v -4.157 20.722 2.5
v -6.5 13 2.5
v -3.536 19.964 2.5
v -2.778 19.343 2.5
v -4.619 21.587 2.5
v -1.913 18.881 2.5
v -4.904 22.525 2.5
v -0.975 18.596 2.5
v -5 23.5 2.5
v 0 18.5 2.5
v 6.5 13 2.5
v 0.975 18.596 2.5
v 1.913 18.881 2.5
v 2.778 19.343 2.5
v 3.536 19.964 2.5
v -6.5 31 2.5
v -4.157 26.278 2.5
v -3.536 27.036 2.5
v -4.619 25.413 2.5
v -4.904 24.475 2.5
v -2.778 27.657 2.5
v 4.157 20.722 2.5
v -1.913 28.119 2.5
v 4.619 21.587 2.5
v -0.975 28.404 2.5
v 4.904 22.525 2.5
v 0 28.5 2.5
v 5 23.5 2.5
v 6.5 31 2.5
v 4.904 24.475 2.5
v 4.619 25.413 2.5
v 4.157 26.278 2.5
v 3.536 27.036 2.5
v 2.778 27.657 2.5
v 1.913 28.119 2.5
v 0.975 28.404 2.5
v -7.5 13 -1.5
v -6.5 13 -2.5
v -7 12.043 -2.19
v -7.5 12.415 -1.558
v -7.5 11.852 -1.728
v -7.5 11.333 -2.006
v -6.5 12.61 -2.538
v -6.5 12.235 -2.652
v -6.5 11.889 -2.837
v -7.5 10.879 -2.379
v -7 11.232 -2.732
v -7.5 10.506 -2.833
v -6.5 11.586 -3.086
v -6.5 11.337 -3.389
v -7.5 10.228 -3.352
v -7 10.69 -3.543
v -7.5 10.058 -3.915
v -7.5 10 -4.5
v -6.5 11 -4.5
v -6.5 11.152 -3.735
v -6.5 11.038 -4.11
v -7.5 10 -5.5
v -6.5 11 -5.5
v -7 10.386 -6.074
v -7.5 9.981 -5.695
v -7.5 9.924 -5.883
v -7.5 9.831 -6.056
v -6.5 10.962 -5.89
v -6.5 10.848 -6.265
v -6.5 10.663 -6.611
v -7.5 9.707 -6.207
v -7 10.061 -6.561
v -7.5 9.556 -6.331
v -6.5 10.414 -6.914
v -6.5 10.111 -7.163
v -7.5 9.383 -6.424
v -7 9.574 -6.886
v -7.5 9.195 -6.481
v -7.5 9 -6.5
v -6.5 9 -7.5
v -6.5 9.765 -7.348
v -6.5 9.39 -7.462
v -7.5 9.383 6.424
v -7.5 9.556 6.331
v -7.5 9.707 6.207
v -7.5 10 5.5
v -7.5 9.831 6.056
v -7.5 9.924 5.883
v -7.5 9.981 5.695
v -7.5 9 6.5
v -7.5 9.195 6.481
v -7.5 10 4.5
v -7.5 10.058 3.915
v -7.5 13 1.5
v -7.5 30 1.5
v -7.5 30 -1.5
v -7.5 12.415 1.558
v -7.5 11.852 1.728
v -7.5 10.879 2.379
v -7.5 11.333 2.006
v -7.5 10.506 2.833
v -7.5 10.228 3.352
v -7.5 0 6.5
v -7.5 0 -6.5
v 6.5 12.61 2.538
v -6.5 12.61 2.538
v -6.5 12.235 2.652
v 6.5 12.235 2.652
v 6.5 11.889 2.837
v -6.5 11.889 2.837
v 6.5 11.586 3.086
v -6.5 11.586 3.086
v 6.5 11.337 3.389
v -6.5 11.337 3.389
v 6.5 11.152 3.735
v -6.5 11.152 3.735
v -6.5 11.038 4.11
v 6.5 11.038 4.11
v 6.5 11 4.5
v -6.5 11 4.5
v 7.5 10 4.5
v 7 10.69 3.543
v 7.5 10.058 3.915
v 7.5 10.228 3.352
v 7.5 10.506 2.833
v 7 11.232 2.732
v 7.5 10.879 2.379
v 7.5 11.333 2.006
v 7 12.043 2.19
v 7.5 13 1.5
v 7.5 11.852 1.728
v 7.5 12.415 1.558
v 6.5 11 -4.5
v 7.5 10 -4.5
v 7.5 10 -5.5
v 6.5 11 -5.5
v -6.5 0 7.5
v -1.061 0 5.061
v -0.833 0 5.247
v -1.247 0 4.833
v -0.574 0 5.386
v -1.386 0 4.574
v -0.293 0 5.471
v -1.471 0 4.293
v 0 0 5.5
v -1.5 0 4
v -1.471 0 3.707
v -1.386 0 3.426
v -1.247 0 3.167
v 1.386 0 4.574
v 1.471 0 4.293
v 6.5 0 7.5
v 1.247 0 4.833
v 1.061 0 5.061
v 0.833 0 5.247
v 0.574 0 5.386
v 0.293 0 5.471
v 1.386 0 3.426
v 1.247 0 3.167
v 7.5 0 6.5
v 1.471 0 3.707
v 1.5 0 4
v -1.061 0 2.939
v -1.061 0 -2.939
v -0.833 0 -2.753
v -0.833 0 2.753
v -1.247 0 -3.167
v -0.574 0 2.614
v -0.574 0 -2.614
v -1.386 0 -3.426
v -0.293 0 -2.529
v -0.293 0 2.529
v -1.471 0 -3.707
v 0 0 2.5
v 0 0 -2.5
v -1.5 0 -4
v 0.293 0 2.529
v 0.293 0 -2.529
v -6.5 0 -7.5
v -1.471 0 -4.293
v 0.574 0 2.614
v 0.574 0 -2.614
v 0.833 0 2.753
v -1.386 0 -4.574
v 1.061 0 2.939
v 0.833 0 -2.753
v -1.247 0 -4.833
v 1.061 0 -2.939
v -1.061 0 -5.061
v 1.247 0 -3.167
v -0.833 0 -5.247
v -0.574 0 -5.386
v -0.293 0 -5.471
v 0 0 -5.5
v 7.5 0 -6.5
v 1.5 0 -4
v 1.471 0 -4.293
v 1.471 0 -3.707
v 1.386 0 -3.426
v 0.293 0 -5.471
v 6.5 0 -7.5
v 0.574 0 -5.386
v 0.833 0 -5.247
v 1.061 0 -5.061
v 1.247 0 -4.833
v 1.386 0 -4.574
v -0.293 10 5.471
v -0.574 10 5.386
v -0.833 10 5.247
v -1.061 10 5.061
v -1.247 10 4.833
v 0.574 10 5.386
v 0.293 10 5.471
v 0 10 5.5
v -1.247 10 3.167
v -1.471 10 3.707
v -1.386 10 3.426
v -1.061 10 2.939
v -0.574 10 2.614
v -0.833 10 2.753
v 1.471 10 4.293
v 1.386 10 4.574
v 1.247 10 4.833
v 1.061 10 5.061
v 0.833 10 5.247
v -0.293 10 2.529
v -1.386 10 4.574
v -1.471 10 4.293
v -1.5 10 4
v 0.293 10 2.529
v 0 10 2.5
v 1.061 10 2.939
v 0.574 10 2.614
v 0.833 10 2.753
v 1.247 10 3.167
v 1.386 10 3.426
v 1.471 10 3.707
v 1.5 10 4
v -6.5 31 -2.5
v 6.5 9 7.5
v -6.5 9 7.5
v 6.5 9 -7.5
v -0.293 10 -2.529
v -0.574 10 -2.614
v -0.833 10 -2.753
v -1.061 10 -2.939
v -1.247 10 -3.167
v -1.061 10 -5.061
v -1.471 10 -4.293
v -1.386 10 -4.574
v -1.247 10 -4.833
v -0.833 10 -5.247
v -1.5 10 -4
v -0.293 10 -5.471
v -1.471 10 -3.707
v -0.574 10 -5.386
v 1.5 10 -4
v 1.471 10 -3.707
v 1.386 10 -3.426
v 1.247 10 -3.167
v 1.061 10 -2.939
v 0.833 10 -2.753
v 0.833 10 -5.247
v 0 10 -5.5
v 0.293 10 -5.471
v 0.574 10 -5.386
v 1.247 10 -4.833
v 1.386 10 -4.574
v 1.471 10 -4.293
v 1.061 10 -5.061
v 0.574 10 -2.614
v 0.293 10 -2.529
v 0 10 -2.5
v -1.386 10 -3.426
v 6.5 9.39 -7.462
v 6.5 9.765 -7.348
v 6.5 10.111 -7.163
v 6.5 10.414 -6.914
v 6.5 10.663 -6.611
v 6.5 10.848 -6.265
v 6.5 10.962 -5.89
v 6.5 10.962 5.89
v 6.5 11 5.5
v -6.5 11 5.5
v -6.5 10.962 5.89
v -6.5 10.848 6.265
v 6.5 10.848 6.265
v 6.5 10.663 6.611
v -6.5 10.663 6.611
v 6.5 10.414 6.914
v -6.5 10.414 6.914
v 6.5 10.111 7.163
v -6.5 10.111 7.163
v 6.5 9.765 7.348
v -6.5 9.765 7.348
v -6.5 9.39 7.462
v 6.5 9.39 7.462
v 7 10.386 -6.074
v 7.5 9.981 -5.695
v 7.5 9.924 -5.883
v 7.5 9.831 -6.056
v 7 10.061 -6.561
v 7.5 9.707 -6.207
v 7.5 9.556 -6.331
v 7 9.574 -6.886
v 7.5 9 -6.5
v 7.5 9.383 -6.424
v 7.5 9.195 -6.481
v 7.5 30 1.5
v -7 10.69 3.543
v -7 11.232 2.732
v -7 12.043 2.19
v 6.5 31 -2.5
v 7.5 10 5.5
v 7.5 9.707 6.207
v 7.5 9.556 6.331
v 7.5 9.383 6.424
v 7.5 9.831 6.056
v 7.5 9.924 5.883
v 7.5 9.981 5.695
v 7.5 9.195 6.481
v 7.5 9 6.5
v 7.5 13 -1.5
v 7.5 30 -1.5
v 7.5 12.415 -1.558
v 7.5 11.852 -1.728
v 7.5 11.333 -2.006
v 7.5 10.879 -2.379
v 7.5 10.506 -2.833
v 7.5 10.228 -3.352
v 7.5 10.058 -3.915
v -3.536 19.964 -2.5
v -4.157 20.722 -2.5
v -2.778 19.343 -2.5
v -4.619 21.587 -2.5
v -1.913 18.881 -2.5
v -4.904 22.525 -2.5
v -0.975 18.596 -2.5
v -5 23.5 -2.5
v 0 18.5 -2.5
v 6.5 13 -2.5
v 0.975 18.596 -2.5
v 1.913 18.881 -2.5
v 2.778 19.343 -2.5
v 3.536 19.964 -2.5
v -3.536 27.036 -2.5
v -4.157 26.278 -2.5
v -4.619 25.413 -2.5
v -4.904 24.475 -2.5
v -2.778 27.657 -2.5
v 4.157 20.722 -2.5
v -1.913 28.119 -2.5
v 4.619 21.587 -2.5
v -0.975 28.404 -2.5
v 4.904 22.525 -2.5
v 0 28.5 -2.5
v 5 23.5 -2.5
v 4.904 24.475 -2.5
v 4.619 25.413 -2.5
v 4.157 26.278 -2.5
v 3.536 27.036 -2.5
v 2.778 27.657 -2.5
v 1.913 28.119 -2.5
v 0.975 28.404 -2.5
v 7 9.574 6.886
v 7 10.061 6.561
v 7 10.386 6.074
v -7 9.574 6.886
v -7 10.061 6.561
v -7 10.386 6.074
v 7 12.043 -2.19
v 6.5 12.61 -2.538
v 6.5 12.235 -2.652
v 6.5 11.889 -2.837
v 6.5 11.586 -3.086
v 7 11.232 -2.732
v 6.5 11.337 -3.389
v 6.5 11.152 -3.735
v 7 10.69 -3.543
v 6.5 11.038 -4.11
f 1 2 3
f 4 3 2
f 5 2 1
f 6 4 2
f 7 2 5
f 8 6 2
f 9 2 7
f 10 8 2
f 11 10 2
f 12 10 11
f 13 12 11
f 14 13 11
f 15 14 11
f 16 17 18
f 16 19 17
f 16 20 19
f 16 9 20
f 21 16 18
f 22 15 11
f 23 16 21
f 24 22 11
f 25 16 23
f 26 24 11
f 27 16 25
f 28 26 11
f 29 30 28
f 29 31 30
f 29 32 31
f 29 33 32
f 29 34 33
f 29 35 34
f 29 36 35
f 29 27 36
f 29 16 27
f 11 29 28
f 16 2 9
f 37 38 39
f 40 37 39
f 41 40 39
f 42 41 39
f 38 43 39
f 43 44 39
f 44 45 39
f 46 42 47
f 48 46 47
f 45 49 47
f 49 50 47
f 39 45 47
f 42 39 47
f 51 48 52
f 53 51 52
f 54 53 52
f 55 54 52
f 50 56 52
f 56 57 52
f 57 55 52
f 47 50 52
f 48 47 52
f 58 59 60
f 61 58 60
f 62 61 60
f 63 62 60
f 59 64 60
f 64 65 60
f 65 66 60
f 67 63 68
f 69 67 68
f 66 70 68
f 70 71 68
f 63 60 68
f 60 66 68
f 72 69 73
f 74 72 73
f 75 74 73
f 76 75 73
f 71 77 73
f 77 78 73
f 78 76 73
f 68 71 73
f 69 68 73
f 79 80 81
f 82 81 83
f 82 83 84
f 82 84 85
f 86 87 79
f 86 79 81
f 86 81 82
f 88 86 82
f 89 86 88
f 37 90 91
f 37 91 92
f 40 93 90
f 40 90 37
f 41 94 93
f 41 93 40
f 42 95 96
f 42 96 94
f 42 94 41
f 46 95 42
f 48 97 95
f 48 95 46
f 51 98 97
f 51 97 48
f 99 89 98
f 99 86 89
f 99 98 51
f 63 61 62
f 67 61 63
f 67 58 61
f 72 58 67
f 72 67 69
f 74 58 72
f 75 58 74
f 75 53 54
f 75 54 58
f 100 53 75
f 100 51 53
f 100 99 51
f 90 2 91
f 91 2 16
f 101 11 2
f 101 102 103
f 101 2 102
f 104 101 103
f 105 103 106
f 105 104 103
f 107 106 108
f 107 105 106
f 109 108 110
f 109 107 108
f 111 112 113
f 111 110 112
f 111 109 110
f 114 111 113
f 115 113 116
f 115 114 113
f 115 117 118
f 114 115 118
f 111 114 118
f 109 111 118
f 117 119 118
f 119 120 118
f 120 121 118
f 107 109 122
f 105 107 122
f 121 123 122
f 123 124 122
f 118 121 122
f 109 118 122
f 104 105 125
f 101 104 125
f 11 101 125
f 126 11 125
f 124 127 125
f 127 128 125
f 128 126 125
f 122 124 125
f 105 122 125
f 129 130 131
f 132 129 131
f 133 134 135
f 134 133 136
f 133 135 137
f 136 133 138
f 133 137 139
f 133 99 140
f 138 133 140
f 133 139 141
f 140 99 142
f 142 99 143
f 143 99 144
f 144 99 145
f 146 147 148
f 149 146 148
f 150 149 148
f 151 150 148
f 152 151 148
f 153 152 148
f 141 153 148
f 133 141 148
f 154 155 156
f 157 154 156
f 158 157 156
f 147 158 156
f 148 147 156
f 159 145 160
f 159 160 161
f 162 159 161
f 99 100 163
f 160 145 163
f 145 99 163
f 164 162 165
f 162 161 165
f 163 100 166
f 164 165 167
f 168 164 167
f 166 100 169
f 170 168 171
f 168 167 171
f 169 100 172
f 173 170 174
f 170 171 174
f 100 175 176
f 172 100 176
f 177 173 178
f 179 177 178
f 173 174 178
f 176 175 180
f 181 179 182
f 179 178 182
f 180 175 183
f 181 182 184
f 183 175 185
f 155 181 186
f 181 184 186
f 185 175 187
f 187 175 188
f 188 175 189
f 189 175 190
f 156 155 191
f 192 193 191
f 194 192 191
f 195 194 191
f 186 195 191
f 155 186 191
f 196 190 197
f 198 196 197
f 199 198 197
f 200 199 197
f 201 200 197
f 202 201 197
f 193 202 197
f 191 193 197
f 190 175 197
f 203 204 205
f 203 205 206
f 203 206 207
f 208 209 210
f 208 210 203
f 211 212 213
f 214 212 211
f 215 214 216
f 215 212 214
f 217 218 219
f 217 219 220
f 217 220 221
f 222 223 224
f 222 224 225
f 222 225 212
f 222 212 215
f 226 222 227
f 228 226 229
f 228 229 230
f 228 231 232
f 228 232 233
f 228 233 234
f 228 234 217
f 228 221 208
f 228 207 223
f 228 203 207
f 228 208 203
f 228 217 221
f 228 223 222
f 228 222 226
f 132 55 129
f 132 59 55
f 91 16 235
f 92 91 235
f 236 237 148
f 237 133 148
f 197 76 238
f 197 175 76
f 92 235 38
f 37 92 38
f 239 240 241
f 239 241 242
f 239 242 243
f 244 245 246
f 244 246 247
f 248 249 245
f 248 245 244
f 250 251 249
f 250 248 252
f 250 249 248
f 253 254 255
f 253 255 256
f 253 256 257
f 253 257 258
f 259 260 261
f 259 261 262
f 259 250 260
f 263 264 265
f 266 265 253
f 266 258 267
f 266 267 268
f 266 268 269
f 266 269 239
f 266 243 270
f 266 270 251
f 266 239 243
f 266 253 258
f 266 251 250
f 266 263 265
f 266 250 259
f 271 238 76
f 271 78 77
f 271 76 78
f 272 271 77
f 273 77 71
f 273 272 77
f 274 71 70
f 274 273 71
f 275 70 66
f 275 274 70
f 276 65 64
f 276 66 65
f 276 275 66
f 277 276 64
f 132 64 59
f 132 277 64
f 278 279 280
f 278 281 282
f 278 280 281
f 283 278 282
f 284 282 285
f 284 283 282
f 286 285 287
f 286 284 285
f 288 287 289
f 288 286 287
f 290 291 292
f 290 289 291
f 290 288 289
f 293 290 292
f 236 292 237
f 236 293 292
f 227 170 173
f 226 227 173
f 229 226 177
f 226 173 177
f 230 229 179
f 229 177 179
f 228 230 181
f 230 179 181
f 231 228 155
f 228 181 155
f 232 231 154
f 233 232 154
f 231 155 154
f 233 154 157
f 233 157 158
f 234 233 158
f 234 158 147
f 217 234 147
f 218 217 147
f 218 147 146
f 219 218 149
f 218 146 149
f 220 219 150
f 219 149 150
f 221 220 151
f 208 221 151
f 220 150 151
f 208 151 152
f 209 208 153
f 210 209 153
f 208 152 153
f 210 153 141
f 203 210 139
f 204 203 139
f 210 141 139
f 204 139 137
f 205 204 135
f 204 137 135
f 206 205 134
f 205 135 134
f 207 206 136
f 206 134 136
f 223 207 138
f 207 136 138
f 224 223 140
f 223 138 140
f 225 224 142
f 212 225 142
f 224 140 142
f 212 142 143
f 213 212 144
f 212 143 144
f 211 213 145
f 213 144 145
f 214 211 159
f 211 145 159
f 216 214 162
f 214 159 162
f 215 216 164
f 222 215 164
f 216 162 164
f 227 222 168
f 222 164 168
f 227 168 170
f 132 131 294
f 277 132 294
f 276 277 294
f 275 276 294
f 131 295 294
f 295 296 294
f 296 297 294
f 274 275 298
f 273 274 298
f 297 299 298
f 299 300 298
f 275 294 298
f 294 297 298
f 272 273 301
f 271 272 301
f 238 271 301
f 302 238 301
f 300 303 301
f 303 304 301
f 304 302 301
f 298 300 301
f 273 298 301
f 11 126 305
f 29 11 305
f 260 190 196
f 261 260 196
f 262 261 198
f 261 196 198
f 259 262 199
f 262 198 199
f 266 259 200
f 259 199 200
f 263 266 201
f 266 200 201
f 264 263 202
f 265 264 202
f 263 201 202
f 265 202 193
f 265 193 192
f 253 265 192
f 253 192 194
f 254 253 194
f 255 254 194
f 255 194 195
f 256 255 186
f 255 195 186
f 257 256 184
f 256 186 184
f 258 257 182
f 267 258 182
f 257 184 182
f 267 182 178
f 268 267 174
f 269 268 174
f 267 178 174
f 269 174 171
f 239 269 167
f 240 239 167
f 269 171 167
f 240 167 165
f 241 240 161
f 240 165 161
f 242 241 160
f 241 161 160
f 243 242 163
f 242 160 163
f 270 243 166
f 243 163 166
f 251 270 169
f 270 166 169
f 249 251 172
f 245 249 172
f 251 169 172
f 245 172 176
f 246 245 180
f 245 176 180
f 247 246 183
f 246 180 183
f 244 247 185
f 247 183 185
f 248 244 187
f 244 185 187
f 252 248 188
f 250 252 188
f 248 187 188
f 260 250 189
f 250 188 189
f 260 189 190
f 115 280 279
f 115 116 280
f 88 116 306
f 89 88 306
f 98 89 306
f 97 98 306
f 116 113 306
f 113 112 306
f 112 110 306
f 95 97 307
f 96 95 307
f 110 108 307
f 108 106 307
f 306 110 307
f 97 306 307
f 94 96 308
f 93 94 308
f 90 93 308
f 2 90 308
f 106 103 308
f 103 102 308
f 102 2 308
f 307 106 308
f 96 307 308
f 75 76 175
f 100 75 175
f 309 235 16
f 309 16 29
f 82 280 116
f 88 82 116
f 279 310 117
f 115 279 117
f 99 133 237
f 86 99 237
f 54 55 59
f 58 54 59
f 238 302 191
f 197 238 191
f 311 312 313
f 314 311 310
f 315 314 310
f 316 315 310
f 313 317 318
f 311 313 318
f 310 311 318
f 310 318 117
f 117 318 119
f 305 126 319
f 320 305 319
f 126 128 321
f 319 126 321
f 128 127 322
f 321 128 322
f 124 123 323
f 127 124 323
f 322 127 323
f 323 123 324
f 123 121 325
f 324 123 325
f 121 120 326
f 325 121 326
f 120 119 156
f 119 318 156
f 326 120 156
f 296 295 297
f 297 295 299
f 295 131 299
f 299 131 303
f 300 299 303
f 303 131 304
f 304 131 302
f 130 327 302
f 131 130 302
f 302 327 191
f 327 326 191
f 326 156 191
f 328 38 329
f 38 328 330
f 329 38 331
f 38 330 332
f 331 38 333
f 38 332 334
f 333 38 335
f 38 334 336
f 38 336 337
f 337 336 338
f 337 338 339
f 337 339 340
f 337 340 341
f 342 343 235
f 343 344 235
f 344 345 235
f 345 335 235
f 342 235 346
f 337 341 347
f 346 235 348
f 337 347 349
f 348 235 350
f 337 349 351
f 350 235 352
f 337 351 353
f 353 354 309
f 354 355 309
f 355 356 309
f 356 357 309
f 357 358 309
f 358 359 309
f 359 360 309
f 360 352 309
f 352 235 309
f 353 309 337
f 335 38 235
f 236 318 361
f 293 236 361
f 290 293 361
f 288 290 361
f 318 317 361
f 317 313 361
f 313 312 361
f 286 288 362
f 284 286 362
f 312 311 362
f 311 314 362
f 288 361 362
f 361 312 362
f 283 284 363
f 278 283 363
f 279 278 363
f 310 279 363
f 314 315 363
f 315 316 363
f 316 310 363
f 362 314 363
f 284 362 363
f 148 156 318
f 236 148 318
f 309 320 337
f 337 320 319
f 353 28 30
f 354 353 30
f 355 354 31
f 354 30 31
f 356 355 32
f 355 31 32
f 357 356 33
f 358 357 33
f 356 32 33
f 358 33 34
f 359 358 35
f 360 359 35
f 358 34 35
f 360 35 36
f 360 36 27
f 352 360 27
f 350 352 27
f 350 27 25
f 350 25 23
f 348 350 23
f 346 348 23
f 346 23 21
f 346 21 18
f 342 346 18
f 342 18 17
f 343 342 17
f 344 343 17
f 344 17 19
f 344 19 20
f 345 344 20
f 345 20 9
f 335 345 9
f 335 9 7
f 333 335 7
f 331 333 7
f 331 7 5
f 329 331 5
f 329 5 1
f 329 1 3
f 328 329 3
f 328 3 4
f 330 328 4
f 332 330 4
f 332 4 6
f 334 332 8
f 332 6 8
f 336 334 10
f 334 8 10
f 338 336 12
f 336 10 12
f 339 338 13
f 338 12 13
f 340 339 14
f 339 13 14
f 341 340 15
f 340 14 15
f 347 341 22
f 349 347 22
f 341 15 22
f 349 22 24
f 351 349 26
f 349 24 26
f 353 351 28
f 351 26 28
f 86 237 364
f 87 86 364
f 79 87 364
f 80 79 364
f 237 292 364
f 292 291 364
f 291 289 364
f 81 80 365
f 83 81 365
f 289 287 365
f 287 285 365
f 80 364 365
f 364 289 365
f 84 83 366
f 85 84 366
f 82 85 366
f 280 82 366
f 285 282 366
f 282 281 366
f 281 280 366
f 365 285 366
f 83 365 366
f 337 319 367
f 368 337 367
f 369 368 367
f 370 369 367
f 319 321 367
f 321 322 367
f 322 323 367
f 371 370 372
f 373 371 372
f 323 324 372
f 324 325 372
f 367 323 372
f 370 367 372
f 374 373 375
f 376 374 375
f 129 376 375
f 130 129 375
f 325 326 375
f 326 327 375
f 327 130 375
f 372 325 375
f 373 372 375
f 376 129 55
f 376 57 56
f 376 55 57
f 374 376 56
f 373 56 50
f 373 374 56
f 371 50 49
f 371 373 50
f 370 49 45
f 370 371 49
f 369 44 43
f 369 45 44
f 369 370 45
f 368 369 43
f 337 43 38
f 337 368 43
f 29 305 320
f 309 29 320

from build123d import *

# Parameters (mm, degrees)
SKETCH1_W           = 15
SKETCH1_H           = 15
BOSS_EXTRUDE1_DEPTH = 31
SKETCH2_R           = 5
CUT_EXTRUDE1_DEPTH  = 25
SKETCH3_W           = 15
SKETCH3_H           = 5
CUT_EXTRUDE2_DEPTH  = 20
FILLET4_R           = 2
CHAMFER1_SIZE       = 1
SKETCH4_R           = 1.5
CUT_EXTRUDE3_DEPTH  = 10


with BuildPart() as part:
    # Sketch1 → Boss-Extrude1 (new body)
    with BuildSketch(Plane(origin=(0, 0, 0), x_dir=(1, 0, 0), z_dir=(0, 1, 0))):
        Rectangle(SKETCH1_W, SKETCH1_H)
    extrude(amount=BOSS_EXTRUDE1_DEPTH)

    # Sketch2 → Cut-Extrude1 (cut)
    with BuildSketch(Plane.XY.offset(7.5)):
        with Locations((0, 23.5)):
            Circle(SKETCH2_R)
    extrude(amount=-CUT_EXTRUDE1_DEPTH, mode=Mode.SUBTRACT)

    # Sketch3 → Cut-Extrude2 (cut)
    with BuildSketch(Plane(origin=(0, 31, 0), x_dir=(1, 0, 0), z_dir=(0, 1, 0))):
        with Locations((0, 5)):
            Rectangle(SKETCH3_W, SKETCH3_H)
        with Locations((0, -5)):
            Rectangle(SKETCH3_W, SKETCH3_H)
    extrude(amount=-CUT_EXTRUDE2_DEPTH, mode=Mode.SUBTRACT)

    # Fillet4
    fillet4_edges = [part.edges().sort_by_distance(p)[0] for p in [
        (0, 11, -7.5),
        (0, 11, -2.5),
        (0, 11, 7.5),
        (0, 11, 2.5),
    ]]
    fillet(fillet4_edges, radius=FILLET4_R)

    # Chamfer1
    chamfer1_edges = [part.edges().sort_by_distance(p)[0] for p in [
        (-7.5, 31, 0),
        (7.5, 31, 0),
        (7.5, 11, 5),
        (-7.5, 11, 5),
        (7.5, 11, -5),
        (7.5, 22, -2.5),
        (7.5, 22, 2.5),
        (7.5, 4.5, 7.5),
        (7.5, 4.5, -7.5),
        (7.5, 10.414213562, -6.914213562),
        (7.5, 10.414213562, 6.914213562),
        (-7.5, 4.5, 7.5),
        (-7.5, 11, -5),
        (-7.5, 4.5, -7.5),
        (-7.5, 22, 2.5),
        (-7.5, 22, -2.5),
        (-7.5, 10.414213562, -6.914213562),
        (-7.5, 10.414213562, 6.914213562),
        (7.5, 11.585786438, -3.085786438),
        (-7.5, 11.585786438, -3.085786438),
        (-7.5, 11.585786438, 3.085786438),
        (7.5, 11.585786438, 3.085786438),
    ]]
    chamfer(chamfer1_edges, length=CHAMFER1_SIZE)

    # Sketch4 → Cut-Extrude3 (cut)
    with BuildSketch(Plane.XZ):
        with Locations(Location((0, 4, 0), (0, 0, 270))):
            Circle(SKETCH4_R)
        with Locations(Location((0, -4, 0), (0, 0, 270))):
            Circle(SKETCH4_R)
    extrude(amount=-CUT_EXTRUDE3_DEPTH, mode=Mode.SUBTRACT)


solid = part.part
